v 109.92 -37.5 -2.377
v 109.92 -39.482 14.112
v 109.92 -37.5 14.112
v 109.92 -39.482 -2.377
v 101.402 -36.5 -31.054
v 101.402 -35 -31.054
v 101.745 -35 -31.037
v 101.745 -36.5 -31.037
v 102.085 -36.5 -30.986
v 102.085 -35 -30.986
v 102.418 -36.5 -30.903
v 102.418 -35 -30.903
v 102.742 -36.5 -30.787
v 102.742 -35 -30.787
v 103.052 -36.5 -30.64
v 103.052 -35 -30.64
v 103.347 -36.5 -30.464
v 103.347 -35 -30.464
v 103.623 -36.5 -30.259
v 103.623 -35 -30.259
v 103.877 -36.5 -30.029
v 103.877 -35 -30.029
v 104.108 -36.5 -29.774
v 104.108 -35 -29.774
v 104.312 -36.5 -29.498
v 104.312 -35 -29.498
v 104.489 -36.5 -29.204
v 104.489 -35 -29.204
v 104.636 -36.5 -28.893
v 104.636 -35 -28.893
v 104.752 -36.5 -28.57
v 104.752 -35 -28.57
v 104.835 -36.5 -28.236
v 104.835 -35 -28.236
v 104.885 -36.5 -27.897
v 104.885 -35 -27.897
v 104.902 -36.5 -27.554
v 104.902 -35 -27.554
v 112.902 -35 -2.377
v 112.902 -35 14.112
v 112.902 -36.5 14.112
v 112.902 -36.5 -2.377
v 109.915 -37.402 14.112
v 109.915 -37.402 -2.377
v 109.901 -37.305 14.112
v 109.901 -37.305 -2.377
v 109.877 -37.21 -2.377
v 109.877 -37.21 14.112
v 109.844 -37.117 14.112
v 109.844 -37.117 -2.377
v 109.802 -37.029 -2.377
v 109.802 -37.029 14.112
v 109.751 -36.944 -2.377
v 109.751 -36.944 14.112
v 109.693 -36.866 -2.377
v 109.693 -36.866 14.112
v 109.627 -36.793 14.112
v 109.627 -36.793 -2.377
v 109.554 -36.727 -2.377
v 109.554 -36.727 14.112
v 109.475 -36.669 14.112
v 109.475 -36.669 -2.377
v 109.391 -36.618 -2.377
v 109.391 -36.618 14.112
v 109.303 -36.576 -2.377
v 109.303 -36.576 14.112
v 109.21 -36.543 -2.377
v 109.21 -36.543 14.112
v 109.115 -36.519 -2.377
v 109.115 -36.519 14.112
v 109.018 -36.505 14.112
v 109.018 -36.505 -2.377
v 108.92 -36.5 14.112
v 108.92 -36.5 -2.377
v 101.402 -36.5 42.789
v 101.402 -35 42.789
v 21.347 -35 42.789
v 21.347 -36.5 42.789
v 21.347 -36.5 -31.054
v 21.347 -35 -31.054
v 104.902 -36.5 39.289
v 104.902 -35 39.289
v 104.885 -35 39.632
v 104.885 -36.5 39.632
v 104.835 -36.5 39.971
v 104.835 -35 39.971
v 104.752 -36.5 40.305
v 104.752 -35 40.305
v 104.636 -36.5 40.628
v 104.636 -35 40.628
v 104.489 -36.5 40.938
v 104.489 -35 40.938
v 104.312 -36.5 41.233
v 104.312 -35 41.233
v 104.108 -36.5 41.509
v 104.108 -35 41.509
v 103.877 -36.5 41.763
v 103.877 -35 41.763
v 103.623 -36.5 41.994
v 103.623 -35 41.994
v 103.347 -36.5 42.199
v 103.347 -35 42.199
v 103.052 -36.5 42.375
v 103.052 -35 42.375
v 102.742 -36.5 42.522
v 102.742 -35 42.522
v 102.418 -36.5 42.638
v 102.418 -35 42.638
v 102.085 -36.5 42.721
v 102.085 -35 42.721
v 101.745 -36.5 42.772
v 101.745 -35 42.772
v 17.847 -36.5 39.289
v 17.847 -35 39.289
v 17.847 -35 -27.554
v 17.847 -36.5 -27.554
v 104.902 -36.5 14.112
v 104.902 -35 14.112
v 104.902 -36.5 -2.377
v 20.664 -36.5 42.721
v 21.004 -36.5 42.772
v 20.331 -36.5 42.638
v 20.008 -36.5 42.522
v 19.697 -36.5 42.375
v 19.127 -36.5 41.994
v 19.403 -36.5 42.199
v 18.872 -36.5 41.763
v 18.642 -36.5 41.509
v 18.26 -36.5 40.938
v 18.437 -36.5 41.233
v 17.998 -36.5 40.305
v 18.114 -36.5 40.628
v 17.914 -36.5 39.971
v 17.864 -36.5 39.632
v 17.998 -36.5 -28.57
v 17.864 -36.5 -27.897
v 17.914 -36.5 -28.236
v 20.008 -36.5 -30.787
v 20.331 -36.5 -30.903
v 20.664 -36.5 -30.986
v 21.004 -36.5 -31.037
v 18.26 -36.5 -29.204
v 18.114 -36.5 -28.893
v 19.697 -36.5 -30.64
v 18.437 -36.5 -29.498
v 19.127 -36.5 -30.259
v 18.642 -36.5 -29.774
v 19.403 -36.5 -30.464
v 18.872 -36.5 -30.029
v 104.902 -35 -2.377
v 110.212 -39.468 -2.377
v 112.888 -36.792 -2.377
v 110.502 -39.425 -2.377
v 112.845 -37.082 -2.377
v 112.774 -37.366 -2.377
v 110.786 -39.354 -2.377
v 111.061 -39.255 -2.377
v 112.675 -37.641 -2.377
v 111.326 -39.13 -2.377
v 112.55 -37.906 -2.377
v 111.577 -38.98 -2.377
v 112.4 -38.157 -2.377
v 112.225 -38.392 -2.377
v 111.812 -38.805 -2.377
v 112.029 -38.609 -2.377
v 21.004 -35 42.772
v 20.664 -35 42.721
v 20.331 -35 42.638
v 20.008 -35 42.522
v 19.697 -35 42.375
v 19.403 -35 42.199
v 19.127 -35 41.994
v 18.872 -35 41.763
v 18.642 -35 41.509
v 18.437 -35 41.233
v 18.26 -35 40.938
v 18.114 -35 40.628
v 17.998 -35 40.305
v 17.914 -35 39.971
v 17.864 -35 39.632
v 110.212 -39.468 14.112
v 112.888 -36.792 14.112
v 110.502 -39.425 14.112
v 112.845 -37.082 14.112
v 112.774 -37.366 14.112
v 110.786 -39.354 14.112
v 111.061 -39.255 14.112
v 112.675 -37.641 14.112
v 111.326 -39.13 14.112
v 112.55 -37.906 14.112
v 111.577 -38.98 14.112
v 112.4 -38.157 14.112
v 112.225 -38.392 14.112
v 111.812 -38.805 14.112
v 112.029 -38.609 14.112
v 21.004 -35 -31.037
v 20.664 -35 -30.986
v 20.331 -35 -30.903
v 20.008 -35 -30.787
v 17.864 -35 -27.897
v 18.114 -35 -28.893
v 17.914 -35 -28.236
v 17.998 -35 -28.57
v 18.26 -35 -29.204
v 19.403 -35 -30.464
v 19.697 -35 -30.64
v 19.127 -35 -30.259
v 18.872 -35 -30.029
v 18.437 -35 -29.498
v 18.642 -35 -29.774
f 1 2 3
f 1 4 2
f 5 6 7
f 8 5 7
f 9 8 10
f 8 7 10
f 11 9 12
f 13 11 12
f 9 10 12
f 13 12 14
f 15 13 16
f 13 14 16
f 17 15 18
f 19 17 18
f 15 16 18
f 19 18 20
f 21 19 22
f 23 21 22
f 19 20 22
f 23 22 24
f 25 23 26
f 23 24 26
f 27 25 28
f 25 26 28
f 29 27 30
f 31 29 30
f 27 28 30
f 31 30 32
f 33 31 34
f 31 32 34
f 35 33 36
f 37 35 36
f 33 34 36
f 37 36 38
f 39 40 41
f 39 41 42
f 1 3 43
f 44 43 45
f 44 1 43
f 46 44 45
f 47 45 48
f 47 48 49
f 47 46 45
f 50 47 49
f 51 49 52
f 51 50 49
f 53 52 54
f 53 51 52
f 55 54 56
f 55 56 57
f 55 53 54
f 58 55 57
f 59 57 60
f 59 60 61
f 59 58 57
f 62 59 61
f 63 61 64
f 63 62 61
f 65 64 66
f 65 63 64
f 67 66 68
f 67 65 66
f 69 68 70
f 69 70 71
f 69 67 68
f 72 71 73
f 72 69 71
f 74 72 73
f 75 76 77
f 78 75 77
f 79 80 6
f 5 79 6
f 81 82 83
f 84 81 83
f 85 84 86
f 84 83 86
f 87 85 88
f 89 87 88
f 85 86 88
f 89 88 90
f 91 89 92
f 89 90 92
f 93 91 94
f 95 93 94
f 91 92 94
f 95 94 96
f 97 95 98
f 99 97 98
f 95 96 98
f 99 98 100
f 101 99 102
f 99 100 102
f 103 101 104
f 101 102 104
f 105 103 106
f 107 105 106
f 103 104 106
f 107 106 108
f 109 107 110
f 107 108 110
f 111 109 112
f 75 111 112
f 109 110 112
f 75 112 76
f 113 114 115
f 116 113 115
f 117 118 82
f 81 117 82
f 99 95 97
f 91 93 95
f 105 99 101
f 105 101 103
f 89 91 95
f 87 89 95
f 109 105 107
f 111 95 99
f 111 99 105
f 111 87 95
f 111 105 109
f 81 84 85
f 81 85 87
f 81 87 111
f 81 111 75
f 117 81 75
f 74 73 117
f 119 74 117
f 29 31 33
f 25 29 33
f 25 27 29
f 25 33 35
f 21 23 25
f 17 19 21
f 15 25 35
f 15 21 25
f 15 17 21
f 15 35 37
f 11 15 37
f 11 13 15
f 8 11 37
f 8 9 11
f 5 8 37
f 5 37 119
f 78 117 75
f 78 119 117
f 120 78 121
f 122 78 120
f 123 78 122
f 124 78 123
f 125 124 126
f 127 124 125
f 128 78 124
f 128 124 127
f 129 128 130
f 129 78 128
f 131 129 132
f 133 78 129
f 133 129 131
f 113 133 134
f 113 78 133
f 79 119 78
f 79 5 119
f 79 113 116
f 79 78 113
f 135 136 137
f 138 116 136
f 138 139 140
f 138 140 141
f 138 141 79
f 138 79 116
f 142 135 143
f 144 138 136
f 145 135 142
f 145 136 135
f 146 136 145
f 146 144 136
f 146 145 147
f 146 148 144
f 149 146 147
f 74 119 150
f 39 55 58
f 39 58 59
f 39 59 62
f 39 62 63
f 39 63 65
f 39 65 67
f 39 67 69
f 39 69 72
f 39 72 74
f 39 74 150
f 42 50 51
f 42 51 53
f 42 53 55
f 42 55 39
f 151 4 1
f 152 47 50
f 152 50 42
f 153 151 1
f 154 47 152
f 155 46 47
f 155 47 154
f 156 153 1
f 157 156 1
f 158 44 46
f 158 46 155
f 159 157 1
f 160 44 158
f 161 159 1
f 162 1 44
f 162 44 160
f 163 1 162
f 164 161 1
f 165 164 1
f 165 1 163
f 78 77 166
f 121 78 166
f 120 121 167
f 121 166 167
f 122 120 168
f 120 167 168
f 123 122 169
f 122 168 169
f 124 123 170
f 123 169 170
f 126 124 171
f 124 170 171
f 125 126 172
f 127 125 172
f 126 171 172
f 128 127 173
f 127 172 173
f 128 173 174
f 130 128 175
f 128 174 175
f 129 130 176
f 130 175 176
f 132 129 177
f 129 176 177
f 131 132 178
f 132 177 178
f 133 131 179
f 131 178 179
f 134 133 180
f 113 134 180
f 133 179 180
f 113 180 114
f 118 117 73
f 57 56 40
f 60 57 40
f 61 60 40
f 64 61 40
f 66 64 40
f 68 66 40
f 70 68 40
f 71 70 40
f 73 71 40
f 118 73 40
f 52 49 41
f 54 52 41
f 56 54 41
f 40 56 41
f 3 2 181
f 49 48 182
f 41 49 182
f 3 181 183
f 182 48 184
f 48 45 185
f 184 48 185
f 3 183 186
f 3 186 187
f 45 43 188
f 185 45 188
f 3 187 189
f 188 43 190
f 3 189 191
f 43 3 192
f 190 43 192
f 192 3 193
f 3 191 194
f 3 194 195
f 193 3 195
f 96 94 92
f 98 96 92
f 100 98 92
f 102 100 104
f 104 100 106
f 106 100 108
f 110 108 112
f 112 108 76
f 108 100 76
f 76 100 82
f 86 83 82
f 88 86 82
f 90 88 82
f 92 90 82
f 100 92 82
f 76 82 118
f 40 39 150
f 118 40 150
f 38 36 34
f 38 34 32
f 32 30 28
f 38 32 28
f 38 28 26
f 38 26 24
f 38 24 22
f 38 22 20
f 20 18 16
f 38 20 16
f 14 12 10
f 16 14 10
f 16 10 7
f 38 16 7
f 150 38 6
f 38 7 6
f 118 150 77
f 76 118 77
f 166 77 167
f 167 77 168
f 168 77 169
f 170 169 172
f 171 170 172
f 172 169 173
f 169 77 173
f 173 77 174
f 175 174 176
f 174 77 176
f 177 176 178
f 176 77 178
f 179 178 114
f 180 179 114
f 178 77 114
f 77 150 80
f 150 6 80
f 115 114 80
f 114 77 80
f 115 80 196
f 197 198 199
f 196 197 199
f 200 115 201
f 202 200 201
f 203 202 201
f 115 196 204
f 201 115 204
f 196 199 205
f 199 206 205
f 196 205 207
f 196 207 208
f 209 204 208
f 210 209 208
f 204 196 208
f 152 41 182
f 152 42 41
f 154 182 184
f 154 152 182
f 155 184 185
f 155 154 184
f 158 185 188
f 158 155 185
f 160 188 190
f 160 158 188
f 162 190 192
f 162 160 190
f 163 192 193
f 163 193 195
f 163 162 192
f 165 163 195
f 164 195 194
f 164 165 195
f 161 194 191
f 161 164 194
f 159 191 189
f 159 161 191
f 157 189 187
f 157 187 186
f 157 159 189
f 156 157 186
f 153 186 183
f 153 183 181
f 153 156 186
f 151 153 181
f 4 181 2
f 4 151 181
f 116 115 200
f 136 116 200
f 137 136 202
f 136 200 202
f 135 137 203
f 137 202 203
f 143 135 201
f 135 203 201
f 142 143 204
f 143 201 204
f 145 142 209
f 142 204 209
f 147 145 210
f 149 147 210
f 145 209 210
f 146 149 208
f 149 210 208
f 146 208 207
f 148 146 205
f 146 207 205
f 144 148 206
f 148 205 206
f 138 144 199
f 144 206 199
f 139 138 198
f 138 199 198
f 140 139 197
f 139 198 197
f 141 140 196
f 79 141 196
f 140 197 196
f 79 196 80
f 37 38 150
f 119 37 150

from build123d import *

# Parameters (mm, degrees)
BOSS_EXTRUDE1_DEPTH = 1.5
SKETCH3_W           = 16.488499631
SKETCH3_H           = 1.5
BOSS_EXTRUDE2_DEPTH = 8
SKETCH4_W           = 2.982324071
SKETCH4_H           = 16.488499631
REVOLVE1_ANGLE      = 90
FILLET1_R           = 1


with BuildPart() as part:
    # Sketch2 → Boss-Extrude1 (new body)
    with BuildSketch(Plane(origin=(0, -35, 0), x_dir=(1, 0, 0), z_dir=(0, 1, 0))):
        with BuildLine():
            Line((21.347125896, 31.053674712), (101.402209804, 31.053674712))
            ThreePointArc((101.402209804, 31.053674712), (103.877083539, 30.028548446), (104.902209804, 27.553674712))
            Line((104.902209804, 27.553674712), (104.902209804, -39.288548186))
            ThreePointArc((104.902209804, -39.288548186), (103.877083539, -41.76342192), (101.402209804, -42.788548186))
            Line((101.402209804, -42.788548186), (21.347125896, -42.788548186))
            ThreePointArc((21.347125896, -42.788548186), (18.872252162, -41.76342192), (17.847125896, -39.288548186))
            Line((17.847125896, -39.288548186), (17.847125896, 27.553674712))
            ThreePointArc((17.847125896, 27.553674712), (18.872252162, 30.028548446), (21.347125896, 31.053674712))
        make_face()
    extrude(amount=-BOSS_EXTRUDE1_DEPTH)

    # Sketch3 → Boss-Extrude2 (add)
    with BuildSketch(Plane(origin=(104.902209804, 0, 0), x_dir=(0, 0, -1), z_dir=(1, 0, 0))):
        with Locations((-5.867436738, -35.75)):
            Rectangle(SKETCH3_W, SKETCH3_H)
    extrude(amount=BOSS_EXTRUDE2_DEPTH)

    # Sketch4 → Revolve1 (revolve)
    with BuildSketch(Plane(origin=(0, -36.5, 0), x_dir=(-1, 0, 0), z_dir=(0, -1, 0))):
        with Locations((-111.411047768, -5.867436738)):
            Rectangle(SKETCH4_W, SKETCH4_H)
    revolve(axis=Axis((109.919885733, -36.5, 14.111686553), (0, 0, -1)), revolution_arc=REVOLVE1_ANGLE)

    # Fillet1
    fillet1_edges = [part.edges().sort_by_distance(p)[0] for p in [
        (109.919885733, -36.5, 5.867436737),
    ]]
    fillet(fillet1_edges, radius=FILLET1_R)


solid = part.part
